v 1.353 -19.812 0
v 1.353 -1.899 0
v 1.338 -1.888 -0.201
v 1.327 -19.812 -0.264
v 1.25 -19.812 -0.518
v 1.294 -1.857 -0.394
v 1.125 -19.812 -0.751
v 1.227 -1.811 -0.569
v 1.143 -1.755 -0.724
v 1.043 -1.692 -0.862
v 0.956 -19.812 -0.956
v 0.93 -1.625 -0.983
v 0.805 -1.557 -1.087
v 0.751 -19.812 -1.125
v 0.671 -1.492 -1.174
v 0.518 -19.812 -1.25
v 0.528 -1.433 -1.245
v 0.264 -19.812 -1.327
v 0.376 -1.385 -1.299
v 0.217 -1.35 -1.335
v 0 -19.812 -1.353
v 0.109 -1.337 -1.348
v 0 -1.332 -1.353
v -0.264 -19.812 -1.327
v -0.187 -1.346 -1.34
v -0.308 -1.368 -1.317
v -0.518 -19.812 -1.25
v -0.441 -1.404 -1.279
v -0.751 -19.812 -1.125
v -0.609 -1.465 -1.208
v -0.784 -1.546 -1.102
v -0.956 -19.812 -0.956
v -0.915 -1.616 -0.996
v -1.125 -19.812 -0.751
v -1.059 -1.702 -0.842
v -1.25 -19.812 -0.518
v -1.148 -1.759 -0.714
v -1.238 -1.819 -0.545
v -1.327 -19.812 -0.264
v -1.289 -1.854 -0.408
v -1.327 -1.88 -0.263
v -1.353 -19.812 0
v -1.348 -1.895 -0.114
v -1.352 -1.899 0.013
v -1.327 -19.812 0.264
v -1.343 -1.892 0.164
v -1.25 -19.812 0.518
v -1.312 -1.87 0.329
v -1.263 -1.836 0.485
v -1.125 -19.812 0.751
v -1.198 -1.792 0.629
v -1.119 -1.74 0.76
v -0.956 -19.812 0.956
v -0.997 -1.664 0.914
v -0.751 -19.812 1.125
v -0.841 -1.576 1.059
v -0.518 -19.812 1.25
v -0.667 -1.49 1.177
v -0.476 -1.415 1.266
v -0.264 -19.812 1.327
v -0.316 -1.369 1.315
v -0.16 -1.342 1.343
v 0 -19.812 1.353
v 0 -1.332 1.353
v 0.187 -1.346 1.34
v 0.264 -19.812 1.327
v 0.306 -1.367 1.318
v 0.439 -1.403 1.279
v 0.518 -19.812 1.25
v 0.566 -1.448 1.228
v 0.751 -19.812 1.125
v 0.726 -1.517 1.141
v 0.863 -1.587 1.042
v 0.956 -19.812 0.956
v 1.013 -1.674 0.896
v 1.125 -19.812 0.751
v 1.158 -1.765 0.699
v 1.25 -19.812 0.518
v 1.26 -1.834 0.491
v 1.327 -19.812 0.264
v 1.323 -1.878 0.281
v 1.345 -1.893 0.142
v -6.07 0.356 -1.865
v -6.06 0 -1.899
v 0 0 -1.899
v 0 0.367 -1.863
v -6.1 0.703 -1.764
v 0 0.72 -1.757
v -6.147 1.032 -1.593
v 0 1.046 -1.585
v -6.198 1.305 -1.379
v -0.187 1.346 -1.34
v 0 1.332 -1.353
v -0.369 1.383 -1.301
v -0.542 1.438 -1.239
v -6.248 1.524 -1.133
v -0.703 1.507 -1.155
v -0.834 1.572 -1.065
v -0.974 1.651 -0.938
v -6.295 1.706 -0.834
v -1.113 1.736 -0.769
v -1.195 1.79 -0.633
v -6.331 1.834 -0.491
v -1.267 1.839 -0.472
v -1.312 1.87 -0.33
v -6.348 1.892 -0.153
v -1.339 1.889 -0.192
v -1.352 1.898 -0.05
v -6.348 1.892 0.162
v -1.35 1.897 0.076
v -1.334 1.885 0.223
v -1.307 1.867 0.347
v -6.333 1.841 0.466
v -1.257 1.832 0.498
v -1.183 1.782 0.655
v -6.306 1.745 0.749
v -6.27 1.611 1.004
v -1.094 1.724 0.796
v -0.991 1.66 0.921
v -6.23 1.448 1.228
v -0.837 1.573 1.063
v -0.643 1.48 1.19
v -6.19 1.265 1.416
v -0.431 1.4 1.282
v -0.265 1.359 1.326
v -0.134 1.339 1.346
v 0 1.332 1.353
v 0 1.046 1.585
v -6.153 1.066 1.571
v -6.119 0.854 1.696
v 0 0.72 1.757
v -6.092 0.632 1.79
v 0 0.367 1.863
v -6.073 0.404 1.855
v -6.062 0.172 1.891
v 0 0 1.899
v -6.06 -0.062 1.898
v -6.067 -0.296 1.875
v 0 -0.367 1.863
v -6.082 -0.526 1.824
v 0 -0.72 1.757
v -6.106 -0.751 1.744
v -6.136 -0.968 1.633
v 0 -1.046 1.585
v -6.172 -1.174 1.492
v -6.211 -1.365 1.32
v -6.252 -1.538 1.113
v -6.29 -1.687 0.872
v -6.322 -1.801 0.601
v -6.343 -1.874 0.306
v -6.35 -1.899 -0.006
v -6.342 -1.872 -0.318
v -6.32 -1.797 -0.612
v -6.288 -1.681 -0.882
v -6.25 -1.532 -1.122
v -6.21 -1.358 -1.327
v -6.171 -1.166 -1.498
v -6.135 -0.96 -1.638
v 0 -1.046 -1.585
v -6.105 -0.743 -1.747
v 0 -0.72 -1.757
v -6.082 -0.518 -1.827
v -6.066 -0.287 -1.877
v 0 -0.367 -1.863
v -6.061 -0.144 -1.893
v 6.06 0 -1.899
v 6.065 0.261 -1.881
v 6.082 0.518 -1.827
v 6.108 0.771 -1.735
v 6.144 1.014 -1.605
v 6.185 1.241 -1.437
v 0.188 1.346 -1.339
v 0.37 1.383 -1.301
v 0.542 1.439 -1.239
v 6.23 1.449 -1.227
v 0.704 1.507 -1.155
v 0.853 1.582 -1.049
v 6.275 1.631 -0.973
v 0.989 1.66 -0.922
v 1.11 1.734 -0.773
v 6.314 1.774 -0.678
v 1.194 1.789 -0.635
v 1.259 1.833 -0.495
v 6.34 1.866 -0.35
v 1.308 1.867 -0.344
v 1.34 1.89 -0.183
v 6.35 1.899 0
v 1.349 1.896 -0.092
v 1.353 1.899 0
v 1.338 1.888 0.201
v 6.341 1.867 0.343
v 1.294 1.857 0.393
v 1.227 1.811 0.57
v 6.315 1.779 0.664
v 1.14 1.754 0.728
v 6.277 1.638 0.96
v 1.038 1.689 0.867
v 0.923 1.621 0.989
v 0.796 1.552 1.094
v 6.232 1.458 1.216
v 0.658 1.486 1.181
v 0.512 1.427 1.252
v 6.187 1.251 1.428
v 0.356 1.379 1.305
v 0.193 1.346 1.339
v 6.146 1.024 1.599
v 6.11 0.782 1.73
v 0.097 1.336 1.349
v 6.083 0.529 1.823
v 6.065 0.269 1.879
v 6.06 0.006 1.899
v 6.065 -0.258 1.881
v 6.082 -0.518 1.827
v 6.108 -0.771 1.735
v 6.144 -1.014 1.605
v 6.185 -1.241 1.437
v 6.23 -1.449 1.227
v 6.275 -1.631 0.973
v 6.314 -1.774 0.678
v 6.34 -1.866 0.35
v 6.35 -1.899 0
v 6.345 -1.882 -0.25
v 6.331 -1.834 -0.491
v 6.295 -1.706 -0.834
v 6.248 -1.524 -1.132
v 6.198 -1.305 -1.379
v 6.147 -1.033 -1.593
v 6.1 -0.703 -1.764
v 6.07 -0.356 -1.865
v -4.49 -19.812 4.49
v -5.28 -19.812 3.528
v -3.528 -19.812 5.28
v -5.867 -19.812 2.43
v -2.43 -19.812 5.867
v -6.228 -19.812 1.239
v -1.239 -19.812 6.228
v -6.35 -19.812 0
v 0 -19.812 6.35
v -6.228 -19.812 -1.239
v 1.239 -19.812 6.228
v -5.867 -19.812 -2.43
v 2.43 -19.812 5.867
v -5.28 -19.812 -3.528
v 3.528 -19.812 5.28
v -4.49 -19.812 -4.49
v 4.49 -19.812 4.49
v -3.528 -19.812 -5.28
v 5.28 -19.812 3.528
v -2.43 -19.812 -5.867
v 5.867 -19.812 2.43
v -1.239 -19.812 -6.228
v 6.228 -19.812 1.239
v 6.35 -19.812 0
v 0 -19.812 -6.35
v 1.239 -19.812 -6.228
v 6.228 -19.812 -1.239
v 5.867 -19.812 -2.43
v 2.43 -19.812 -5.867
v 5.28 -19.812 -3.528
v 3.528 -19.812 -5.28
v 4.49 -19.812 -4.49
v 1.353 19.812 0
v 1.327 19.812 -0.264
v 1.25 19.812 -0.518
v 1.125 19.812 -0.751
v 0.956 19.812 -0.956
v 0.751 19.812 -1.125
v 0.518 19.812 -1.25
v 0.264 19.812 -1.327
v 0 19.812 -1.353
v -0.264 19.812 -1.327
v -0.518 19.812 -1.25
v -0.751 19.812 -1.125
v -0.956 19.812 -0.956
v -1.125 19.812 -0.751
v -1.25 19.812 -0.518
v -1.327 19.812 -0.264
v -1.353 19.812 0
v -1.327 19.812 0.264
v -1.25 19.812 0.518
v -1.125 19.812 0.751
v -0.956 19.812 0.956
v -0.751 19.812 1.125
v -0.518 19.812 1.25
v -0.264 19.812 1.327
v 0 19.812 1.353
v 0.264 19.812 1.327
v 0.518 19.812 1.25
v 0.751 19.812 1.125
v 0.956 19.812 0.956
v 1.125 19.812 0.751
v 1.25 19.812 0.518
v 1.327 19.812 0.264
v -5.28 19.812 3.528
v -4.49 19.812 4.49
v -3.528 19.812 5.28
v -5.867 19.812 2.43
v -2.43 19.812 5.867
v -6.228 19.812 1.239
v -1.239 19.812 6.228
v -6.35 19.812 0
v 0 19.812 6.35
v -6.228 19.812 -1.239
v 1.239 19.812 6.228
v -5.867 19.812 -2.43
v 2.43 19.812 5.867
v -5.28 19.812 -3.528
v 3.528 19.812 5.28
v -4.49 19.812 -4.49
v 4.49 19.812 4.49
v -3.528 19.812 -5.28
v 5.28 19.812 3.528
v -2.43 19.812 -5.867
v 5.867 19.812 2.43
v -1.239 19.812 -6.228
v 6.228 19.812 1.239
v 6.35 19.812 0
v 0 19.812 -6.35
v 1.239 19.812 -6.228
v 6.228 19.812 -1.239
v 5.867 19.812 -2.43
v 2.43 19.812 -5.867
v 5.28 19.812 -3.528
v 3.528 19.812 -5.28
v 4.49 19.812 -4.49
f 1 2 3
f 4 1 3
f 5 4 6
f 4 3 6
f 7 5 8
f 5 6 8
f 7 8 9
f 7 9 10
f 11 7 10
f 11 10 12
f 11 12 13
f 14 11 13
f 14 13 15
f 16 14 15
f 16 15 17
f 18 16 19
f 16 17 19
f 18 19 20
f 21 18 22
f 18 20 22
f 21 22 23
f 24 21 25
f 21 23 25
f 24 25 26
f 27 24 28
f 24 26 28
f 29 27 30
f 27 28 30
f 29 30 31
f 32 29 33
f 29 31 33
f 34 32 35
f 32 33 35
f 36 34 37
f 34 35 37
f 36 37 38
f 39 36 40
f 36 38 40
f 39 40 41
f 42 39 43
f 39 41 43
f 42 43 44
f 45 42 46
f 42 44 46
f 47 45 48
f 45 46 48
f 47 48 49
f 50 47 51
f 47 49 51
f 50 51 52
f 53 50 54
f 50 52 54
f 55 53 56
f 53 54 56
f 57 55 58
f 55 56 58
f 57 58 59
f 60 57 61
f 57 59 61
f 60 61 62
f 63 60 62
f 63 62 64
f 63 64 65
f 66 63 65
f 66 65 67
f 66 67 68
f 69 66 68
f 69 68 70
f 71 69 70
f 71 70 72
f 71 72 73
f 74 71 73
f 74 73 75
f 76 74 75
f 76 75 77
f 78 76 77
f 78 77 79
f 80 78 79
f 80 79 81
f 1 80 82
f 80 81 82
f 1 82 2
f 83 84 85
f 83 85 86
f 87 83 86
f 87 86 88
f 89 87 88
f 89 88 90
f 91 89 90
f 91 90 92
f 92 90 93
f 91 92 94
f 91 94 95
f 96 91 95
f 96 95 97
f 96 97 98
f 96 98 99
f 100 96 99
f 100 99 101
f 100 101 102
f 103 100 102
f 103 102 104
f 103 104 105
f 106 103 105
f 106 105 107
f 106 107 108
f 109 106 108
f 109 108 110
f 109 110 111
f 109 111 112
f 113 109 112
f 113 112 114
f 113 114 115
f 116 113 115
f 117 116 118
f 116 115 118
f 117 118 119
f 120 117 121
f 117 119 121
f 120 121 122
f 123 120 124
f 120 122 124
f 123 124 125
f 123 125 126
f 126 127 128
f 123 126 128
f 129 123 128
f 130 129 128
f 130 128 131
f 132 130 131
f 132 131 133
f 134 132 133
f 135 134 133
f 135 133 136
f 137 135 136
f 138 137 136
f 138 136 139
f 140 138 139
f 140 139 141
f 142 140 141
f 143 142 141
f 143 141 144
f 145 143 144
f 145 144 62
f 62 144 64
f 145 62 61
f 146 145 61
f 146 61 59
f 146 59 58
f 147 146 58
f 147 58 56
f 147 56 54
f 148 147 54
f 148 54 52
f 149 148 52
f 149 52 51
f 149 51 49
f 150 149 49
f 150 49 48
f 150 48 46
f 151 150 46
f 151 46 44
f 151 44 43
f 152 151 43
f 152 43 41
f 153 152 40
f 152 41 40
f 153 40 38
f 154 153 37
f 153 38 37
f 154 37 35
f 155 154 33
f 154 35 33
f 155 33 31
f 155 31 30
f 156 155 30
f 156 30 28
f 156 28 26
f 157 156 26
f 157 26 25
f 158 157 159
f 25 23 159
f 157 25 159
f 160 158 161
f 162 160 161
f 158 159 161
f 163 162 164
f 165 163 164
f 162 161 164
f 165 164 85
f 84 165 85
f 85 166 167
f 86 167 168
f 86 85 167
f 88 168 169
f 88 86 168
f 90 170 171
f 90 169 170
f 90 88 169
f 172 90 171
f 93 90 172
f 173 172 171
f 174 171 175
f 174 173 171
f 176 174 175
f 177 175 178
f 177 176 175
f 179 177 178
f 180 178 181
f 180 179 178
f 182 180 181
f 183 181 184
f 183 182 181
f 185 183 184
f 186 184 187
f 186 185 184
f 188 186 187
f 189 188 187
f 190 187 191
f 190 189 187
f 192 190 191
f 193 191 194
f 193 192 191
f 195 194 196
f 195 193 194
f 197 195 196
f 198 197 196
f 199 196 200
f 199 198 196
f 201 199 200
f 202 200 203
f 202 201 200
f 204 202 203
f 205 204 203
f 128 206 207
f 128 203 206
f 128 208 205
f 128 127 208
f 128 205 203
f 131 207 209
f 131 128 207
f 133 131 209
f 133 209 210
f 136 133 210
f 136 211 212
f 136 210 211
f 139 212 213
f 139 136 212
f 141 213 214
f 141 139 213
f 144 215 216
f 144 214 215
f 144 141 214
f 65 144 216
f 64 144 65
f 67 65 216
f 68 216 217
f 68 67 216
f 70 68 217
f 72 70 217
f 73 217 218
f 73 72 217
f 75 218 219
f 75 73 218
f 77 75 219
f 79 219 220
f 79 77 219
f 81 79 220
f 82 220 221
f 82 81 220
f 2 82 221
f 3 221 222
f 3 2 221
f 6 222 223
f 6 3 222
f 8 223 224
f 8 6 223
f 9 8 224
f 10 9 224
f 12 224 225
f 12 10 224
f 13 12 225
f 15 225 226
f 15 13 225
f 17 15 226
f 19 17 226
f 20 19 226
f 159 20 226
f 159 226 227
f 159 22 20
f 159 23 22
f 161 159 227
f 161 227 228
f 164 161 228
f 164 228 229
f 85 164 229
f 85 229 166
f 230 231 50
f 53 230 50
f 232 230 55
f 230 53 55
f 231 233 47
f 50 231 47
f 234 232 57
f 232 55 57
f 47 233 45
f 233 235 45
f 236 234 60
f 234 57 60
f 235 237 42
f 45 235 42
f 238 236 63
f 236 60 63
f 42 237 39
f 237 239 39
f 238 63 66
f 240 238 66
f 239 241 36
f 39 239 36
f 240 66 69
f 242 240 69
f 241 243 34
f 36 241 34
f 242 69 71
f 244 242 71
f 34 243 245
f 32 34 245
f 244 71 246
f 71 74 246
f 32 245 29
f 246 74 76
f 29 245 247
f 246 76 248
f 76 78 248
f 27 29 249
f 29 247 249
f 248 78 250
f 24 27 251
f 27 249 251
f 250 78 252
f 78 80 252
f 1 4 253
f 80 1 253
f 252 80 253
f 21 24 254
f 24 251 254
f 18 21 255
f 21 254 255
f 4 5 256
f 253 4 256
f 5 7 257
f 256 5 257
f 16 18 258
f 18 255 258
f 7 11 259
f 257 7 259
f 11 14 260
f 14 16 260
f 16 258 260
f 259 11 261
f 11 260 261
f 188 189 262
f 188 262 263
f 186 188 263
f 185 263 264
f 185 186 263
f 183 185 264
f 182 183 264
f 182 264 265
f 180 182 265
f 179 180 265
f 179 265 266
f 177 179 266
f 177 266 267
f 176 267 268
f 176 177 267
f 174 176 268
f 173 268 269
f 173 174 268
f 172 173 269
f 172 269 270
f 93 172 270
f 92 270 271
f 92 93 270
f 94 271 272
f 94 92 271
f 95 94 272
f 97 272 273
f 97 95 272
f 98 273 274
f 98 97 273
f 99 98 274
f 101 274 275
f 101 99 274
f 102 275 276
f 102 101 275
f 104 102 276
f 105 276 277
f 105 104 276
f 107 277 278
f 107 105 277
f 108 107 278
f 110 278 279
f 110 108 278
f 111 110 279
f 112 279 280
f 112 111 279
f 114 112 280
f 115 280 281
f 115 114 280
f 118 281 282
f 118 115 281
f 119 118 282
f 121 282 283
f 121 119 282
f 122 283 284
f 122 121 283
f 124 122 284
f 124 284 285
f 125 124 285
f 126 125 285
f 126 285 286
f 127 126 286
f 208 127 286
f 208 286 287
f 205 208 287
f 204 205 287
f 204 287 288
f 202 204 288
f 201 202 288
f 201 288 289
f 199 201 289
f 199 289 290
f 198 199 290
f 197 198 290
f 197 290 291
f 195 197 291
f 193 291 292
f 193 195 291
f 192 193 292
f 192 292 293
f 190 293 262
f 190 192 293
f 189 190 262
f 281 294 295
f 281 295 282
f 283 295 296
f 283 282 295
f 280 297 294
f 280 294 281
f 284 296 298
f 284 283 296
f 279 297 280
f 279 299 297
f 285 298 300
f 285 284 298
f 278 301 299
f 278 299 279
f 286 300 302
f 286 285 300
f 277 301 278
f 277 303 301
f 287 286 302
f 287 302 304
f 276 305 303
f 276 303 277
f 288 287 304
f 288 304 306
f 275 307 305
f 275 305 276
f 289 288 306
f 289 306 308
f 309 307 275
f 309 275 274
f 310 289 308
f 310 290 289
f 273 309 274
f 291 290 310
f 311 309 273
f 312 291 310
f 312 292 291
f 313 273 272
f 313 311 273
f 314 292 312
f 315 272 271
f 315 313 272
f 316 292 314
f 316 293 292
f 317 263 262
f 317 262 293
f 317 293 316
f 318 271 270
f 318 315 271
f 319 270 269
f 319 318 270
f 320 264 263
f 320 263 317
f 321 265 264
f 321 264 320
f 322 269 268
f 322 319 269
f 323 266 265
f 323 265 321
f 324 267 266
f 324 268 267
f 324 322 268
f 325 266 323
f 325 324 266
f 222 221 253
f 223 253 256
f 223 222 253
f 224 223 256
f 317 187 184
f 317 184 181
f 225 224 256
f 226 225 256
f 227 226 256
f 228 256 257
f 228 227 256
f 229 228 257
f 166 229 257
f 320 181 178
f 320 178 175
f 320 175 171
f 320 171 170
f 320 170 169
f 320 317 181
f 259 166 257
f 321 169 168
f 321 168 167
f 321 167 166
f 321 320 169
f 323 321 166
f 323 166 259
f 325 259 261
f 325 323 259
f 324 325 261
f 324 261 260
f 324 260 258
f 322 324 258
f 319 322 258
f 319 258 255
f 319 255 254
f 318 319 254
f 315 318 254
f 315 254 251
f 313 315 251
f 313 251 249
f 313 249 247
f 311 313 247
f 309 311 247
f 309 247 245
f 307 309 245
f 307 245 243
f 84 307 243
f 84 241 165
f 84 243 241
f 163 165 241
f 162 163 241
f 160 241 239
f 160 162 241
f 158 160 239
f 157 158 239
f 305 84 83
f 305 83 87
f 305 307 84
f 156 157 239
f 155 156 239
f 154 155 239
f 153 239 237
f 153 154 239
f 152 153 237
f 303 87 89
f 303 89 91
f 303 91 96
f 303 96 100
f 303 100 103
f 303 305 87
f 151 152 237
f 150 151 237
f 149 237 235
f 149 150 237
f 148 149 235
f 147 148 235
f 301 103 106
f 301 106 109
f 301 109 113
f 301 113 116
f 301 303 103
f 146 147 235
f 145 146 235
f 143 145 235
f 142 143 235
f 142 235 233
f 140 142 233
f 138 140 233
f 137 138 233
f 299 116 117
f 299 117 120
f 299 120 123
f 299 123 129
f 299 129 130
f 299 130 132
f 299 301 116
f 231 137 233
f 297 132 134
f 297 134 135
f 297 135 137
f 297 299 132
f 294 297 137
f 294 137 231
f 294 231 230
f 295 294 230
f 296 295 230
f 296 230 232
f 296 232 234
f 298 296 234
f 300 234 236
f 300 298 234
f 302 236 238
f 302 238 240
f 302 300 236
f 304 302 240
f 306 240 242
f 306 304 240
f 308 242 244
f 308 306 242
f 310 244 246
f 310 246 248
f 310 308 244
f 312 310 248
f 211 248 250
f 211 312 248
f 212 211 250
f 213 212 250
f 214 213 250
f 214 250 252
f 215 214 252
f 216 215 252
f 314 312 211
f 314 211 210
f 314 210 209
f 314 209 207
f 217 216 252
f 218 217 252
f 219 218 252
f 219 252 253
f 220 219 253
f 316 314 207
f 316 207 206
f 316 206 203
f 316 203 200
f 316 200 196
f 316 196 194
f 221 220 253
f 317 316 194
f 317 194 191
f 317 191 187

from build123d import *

# Parameters (mm, degrees)
EXTRUDE1_DEPTH                 = 19.812
EXTRUDE1_DEPTH_BACK            = 19.812
SKETCH1_R                      = 6.35
SKETCH1_R_2                    = 1.35255
CUT_EXTRUDE1_REACH             = 23.752
SKETCH3_R                      = 1.89865
CUT_EXTRUDE1_DIRECTION_2_REACH = 23.752


with BuildPart() as part:
    # Sketch1 → Extrude1 (new, two sides: drawn at the far end of the back side and taken through both)
    with BuildSketch(Plane(origin=(0, 0, 0), x_dir=(1, 0, 0), z_dir=(0, 1, 0)).offset(-EXTRUDE1_DEPTH_BACK)):
        Circle(SKETCH1_R)
        Circle(SKETCH1_R_2, mode=Mode.SUBTRACT)
    extrude(amount=EXTRUDE1_DEPTH + EXTRUDE1_DEPTH_BACK)

    # Sketch3 → Cut-Extrude1 (cut, up to next)
    with BuildSketch(Plane(origin=(0, 0, 0), x_dir=(0, 0, -1), z_dir=(1, 0, 0)), mode=Mode.PRIVATE) as cut_extrude1_sk1:
        Circle(SKETCH3_R)
    cut_extrude1_tool1 = extrude(cut_extrude1_sk1.sketch, amount=-CUT_EXTRUDE1_REACH, mode=Mode.PRIVATE) & part.part
    add(cut_extrude1_tool1.solids().sort_by_distance((0, 0, 0))[0], mode=Mode.SUBTRACT)

    # Sketch3 → Cut-Extrude1 direction 2 (cut, up to next)
    with BuildSketch(Plane(origin=(0, 0, 0), x_dir=(0, 0, -1), z_dir=(1, 0, 0)), mode=Mode.PRIVATE) as cut_extrude1_direction_2_sk1:
        Circle(SKETCH3_R)
    cut_extrude1_direction_2_tool1 = extrude(cut_extrude1_direction_2_sk1.sketch, amount=CUT_EXTRUDE1_DIRECTION_2_REACH, mode=Mode.PRIVATE) & part.part
    add(cut_extrude1_direction_2_tool1.solids().sort_by_distance((0, 0, 0))[0], mode=Mode.SUBTRACT)


solid = part.part
